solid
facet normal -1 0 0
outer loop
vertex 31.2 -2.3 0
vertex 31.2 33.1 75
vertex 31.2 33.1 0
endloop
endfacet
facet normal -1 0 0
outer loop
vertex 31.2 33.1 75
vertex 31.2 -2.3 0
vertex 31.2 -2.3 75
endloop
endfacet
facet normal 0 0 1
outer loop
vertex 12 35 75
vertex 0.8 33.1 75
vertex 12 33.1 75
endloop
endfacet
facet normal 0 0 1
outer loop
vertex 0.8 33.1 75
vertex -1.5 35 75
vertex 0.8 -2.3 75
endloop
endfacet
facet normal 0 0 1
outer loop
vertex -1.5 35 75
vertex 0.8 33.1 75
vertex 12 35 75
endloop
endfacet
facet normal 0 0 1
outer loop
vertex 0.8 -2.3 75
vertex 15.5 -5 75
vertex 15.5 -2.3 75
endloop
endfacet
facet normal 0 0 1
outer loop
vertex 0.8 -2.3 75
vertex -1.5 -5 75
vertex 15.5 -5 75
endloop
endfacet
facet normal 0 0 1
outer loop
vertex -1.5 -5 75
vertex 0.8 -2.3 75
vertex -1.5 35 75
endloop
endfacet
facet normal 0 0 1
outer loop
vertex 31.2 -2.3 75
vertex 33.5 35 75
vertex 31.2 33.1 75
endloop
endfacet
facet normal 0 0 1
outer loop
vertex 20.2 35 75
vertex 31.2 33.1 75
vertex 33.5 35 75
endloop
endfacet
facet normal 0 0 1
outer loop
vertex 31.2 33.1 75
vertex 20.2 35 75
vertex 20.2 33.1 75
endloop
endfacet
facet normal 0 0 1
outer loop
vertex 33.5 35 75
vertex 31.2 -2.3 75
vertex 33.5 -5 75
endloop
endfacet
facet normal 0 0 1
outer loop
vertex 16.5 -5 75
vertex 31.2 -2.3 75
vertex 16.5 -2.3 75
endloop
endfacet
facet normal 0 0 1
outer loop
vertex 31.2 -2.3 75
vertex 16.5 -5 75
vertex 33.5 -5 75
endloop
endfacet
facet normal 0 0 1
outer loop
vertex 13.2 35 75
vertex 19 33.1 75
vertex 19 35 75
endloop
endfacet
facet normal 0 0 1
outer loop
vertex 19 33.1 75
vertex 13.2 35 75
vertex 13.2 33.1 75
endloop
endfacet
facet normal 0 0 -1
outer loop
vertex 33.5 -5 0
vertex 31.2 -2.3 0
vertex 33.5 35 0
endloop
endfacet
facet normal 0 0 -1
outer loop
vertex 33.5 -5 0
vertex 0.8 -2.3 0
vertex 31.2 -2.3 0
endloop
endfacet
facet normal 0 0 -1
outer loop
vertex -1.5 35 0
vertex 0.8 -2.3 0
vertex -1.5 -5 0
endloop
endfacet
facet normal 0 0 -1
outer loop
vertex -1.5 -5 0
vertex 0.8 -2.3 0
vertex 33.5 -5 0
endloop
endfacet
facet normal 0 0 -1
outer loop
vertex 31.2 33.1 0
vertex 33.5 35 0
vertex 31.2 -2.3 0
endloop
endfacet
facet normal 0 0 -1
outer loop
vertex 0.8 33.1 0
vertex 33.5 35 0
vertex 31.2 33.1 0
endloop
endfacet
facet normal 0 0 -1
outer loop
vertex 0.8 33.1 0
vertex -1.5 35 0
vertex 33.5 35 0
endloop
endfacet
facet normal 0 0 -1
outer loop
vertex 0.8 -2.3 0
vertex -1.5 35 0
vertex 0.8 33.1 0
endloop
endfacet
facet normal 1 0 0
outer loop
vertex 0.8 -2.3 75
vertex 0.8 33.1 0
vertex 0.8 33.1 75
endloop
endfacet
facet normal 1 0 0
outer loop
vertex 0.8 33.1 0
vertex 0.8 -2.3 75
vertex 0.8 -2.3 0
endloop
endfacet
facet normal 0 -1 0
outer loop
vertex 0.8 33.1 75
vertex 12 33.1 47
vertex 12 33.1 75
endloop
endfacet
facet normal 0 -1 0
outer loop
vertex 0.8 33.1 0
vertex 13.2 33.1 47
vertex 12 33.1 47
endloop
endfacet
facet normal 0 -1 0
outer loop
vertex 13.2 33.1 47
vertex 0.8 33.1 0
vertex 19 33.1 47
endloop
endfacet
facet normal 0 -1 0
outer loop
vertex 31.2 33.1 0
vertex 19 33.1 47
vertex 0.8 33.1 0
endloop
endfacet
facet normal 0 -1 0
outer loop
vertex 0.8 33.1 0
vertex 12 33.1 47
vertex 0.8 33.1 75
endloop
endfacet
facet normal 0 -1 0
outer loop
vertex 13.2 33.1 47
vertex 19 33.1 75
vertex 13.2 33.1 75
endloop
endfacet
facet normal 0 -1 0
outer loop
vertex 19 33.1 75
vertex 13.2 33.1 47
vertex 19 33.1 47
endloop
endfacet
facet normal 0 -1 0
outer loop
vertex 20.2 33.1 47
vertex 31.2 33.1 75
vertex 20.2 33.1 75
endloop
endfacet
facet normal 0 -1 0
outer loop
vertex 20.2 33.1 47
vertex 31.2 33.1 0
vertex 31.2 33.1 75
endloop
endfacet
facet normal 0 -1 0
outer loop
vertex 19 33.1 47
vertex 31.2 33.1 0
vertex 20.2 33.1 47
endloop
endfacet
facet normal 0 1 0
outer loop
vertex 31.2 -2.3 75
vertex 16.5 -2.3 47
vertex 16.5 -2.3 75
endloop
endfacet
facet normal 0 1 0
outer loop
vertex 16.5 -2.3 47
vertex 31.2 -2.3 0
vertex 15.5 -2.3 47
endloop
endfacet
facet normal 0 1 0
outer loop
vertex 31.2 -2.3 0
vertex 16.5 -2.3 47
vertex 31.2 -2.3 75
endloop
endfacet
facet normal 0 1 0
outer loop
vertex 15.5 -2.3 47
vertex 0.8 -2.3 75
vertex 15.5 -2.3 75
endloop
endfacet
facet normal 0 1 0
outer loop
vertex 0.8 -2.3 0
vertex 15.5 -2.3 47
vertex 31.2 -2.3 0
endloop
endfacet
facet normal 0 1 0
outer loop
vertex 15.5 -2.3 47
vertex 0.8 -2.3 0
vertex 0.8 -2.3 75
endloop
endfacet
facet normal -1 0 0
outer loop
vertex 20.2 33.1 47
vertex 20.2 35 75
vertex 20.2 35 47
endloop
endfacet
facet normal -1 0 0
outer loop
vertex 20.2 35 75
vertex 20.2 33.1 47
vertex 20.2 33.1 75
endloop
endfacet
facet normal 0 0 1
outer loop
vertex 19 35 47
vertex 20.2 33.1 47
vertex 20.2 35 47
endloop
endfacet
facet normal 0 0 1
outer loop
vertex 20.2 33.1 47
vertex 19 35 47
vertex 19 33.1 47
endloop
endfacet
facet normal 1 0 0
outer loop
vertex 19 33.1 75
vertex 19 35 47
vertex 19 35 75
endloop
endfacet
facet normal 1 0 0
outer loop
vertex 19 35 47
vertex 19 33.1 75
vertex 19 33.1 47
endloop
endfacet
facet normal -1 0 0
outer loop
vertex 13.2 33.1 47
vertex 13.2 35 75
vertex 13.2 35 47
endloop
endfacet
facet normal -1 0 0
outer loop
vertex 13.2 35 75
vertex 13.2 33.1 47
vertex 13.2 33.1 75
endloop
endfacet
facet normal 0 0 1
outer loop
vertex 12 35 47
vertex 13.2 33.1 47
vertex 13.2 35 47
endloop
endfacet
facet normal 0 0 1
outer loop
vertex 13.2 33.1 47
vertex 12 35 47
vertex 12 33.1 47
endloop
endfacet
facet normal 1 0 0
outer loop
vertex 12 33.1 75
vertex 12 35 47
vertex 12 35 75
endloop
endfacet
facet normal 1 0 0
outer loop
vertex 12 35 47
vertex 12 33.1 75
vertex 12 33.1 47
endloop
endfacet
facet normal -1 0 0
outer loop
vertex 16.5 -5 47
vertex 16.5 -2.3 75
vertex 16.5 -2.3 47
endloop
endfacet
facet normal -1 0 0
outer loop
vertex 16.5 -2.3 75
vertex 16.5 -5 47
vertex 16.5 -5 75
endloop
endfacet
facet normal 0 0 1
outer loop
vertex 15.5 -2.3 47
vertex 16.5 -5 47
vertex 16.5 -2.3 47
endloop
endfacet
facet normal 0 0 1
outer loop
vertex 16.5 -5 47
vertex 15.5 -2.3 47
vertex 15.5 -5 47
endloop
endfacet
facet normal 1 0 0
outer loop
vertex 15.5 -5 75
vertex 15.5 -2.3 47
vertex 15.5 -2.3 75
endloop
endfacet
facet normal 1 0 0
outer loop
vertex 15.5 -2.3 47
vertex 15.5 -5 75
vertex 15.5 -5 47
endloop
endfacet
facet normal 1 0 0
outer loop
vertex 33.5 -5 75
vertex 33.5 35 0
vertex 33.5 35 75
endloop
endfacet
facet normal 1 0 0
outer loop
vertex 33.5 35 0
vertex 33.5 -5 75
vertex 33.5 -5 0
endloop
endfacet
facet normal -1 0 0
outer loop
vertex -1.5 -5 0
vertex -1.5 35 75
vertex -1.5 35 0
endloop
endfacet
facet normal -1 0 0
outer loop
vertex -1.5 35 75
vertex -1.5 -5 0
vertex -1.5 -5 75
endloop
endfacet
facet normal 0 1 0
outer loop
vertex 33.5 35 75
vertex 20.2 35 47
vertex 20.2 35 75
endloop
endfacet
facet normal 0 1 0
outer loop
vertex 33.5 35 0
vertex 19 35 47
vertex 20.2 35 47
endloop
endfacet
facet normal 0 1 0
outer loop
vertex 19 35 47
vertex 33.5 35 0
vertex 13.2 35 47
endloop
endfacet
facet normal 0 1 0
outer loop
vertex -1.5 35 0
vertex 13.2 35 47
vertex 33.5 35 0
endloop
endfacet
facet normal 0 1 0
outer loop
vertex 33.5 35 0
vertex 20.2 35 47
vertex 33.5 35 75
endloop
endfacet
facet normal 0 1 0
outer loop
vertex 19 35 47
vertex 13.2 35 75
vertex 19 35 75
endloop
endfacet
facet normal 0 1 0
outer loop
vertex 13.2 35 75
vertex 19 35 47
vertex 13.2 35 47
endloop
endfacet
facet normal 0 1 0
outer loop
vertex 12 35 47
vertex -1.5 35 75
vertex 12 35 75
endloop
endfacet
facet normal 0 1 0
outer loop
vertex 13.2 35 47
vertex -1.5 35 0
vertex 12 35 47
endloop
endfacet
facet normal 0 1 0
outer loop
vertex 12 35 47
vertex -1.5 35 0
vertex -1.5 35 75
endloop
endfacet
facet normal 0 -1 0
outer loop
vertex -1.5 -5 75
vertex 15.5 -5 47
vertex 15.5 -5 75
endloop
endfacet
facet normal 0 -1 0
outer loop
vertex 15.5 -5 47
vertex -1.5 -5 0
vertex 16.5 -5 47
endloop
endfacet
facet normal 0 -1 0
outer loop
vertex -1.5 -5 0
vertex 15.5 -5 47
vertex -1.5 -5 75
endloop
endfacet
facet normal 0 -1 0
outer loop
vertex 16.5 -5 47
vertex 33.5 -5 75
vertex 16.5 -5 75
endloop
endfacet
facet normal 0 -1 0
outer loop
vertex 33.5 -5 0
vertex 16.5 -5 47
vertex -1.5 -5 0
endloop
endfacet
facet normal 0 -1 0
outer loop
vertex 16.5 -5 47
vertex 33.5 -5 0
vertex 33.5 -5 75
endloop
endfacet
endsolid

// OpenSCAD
module example003()
{
	difference() {
		union() {
			translate([-1.5, -5, 0])
				cube([35, 40,  75], center = false);	

			
		}
		union() {
            translate([0.8, -2.3, 0])
				cube([30.4, 35.4,  75], center = false);
            translate([30.1-11-0.1 , 31, 47])
				cube([1.2, 5, 28], center = false);
            translate([0.9+11+0.1, 31, 47])
				cube([1.2, 5, 28], center = false);
            translate([16, -3, 33+28])
                cube([1, 5, 28], center = true);
}
	}
}

example003();
